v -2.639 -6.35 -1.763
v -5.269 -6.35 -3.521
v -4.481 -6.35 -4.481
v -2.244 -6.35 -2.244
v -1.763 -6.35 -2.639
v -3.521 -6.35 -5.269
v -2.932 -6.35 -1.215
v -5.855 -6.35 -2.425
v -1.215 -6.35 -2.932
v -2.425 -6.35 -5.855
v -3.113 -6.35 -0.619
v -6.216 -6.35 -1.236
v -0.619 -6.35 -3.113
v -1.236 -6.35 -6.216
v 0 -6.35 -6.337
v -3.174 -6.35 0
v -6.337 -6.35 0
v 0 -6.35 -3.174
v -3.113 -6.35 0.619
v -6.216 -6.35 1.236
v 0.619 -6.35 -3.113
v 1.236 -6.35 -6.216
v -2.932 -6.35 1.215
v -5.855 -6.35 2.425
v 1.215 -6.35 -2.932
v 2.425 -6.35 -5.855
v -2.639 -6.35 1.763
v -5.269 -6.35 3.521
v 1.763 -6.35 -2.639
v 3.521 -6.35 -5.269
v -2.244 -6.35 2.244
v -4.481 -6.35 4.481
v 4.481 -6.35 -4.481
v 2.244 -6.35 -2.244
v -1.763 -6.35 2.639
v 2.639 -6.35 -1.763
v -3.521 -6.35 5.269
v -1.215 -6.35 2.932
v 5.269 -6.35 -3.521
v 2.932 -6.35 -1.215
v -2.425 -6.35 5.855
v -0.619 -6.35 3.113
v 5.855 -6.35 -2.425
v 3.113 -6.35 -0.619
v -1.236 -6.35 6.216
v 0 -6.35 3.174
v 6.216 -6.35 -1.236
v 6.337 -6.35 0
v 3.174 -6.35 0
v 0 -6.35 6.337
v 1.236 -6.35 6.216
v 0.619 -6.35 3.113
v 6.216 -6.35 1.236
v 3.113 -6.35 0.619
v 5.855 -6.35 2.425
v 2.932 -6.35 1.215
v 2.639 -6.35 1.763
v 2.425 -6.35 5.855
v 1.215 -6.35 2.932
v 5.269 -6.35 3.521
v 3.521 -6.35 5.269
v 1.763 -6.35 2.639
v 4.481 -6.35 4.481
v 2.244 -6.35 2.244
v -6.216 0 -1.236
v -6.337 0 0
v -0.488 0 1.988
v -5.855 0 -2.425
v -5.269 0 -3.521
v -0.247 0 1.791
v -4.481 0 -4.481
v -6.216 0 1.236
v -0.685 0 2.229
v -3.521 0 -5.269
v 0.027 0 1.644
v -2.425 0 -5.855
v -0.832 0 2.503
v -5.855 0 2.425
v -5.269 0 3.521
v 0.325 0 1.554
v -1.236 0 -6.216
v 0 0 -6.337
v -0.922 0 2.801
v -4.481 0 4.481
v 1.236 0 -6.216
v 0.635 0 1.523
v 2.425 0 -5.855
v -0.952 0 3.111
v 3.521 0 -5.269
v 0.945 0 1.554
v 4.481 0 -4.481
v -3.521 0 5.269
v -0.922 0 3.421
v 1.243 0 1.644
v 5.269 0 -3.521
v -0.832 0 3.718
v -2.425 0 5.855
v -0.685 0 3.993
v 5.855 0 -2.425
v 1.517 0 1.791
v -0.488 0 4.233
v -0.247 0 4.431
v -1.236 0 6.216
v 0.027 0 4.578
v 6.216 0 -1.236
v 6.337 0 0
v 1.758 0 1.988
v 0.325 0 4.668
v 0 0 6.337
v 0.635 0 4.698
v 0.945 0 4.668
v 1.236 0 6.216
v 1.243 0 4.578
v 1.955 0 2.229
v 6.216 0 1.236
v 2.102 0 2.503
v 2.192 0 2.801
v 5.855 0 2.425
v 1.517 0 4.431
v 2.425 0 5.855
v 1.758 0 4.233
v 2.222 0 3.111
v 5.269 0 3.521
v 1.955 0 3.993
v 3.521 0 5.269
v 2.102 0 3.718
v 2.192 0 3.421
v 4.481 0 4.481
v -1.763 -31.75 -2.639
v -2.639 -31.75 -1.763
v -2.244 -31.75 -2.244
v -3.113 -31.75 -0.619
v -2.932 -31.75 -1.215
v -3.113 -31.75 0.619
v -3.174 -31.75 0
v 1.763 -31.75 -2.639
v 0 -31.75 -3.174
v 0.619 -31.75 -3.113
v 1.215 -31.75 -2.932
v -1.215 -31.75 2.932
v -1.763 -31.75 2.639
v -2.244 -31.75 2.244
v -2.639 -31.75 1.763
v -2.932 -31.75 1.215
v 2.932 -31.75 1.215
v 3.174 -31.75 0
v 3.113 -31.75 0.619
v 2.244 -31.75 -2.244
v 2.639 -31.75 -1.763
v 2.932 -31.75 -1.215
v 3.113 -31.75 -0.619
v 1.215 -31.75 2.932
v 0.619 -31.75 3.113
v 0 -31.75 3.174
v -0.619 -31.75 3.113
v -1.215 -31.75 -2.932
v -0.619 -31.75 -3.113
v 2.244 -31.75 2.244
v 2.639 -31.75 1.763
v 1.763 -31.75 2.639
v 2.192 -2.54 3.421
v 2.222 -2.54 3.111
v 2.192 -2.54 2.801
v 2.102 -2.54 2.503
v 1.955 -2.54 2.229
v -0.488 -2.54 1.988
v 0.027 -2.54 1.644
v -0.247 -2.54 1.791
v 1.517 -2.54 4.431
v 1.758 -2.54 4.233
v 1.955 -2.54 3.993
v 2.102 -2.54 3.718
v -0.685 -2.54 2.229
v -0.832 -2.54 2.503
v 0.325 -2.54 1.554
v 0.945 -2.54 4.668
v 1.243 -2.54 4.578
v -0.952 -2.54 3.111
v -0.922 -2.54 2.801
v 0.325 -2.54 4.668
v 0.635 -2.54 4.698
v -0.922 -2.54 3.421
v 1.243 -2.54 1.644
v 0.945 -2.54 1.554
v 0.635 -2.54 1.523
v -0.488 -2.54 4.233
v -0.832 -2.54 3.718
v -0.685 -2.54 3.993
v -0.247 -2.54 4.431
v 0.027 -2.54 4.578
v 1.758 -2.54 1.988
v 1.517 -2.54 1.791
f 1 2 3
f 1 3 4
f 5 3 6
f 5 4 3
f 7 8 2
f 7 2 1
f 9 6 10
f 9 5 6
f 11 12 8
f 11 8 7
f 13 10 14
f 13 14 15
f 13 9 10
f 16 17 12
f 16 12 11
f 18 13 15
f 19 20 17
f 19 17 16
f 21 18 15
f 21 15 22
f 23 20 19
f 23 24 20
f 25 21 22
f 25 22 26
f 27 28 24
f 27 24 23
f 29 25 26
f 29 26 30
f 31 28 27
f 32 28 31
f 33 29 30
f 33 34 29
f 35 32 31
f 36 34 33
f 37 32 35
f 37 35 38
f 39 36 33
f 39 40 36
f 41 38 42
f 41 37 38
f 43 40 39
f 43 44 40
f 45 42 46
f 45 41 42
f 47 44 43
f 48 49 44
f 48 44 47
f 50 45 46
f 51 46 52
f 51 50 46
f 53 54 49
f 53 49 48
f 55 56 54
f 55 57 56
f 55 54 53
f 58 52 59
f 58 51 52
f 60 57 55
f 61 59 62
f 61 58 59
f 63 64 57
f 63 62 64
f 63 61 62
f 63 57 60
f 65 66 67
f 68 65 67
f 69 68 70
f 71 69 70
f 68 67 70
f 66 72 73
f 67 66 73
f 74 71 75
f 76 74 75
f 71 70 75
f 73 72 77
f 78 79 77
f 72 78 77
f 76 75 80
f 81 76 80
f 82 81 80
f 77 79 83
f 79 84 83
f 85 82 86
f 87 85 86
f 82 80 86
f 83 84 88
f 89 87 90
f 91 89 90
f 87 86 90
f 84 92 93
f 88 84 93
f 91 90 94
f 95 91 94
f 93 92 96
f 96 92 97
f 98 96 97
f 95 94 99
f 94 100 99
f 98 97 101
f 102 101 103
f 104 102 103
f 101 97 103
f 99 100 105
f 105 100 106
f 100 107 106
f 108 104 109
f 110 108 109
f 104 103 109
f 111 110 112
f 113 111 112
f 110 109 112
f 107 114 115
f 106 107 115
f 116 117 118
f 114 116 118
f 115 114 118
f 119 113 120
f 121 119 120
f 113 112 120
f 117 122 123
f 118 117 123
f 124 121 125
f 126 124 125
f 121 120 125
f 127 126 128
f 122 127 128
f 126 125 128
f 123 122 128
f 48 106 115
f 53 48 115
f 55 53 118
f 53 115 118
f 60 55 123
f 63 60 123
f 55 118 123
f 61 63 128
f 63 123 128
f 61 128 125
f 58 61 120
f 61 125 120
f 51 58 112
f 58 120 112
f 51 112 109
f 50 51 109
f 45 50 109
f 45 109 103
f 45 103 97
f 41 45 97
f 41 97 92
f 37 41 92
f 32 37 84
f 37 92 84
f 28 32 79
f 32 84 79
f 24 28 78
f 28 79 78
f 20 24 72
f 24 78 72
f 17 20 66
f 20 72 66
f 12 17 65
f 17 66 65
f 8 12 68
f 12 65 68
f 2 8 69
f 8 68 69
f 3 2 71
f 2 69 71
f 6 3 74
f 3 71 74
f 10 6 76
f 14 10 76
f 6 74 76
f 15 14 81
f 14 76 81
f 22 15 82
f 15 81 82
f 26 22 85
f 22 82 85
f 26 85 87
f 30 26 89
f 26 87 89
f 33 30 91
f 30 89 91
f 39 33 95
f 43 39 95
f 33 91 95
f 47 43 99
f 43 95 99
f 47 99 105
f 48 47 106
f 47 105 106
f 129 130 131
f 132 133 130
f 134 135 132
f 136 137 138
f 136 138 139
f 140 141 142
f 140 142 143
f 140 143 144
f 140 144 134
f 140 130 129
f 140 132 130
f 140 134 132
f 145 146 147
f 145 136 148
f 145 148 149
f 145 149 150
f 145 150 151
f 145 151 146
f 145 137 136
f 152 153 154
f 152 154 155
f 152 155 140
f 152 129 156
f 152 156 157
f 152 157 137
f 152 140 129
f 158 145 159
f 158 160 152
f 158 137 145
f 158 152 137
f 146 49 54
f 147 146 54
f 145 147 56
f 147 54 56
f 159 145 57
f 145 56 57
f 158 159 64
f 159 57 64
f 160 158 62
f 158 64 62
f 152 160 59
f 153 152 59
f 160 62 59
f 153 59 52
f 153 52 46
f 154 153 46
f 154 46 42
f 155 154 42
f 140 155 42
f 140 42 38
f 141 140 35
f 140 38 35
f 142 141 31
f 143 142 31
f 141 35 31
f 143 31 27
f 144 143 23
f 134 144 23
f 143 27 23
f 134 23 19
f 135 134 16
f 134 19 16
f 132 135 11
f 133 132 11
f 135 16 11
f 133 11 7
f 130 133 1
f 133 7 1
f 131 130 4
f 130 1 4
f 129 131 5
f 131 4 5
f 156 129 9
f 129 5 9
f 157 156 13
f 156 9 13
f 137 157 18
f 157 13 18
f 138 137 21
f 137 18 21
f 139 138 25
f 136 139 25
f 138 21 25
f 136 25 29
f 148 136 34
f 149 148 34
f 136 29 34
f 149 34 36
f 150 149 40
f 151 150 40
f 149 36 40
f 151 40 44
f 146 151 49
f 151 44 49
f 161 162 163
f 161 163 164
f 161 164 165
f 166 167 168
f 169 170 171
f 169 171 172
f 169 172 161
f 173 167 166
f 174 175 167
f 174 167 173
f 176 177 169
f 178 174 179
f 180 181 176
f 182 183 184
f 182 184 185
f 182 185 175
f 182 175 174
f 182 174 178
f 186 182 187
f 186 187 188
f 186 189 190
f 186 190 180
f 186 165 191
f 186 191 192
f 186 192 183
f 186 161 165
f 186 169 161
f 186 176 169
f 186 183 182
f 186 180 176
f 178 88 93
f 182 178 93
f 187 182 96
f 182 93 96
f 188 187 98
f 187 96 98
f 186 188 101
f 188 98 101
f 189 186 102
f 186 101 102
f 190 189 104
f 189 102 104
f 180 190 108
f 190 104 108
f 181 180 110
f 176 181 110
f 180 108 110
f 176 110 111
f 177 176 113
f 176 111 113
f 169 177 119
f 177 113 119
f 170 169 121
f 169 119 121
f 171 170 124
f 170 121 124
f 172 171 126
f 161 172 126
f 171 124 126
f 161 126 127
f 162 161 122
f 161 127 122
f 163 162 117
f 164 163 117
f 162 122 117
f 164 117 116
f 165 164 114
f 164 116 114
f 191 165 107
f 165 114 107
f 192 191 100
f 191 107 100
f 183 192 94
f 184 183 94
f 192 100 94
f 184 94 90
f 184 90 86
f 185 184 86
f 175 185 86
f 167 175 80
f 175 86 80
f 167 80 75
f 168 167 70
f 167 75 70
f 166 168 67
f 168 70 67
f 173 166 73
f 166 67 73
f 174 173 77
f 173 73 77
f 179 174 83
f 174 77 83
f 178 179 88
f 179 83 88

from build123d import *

# Parameters (mm, degrees)
F0_R     = 6.3373
F1_DEPTH = 6.35
F2_R     = 3.17373
F3_DEPTH = 25.4
F4_R     = 1.5875
F5_DEPTH = 2.54


with BuildPart() as f1:
    # F0 (on Front) → F1 (new body)
    with BuildSketch(Plane.XZ):
        Circle(F0_R)
    extrude(amount=F1_DEPTH)

    # F2 (on face) → F3 (join)
    with BuildSketch(Plane.XZ.offset(6.35)):
        Circle(F2_R)
    extrude(amount=F3_DEPTH)

    # F4 (on face) → F5 (cut)
    with BuildSketch(Plane(origin=(0, 0, 0), x_dir=(-1, 0, 0), z_dir=(0, 1, 0))):
        with Locations((-0.635, 3.110852)):
            Circle(F4_R)
    extrude(amount=-F5_DEPTH, mode=Mode.SUBTRACT)


solid = f1.part
